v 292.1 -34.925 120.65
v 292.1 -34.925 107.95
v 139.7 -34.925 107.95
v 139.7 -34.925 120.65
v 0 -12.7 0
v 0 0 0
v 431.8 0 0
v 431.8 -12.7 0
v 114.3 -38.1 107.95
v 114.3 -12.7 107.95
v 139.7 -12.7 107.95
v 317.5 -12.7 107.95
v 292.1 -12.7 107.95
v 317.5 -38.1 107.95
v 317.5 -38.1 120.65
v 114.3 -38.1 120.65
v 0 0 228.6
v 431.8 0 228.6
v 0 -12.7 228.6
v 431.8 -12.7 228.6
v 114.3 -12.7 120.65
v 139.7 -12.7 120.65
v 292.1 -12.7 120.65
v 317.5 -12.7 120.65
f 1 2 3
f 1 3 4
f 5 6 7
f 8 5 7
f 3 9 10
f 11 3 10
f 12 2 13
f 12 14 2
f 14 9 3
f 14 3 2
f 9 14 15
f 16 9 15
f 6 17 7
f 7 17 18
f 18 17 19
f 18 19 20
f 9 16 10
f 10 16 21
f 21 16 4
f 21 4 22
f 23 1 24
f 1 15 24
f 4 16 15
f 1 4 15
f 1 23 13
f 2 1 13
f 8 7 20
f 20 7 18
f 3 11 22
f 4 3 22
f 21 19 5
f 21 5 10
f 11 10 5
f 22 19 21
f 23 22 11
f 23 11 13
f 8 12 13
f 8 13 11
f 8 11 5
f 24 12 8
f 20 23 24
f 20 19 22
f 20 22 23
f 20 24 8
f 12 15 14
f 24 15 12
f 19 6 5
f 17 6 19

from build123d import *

# Parameters (mm, degrees)
F0_W     = 431.8
F0_H     = 228.6
F1_DEPTH = 12.7
F3_DEPTH = 22.225
F4_W     = 3.175
F4_H     = 12.7
F5_DEPTH = 203.2


with BuildPart() as f1:
    # F0 (on Front) → F1 (new body)
    with BuildSketch(Plane.XZ):
        with Locations((215.9, 114.3)):
            Rectangle(F0_W, F0_H)
    extrude(amount=F1_DEPTH)

    # F2 (on face) → F3 (join)
    with BuildSketch(Plane.XZ.offset(12.7)):
        Polygon((139.7, 107.95), (139.7, 114.3), (139.7, 120.65), (114.3, 120.65), (114.3, 114.3), (114.3, 107.95), align=None)
        Polygon((317.5, 120.65), (292.1, 120.65), (292.1, 114.3), (292.1, 107.95), (317.5, 107.95), (317.5, 114.3), align=None)
    extrude(amount=F3_DEPTH)

    # F4 (on face) → F5 (join, through all)
    with BuildSketch(Plane.YZ.offset(317.5)):
        with Locations((-36.5125, 114.3)):
            Rectangle(F4_W, F4_H)
    extrude(amount=-F5_DEPTH)


solid = f1.part
